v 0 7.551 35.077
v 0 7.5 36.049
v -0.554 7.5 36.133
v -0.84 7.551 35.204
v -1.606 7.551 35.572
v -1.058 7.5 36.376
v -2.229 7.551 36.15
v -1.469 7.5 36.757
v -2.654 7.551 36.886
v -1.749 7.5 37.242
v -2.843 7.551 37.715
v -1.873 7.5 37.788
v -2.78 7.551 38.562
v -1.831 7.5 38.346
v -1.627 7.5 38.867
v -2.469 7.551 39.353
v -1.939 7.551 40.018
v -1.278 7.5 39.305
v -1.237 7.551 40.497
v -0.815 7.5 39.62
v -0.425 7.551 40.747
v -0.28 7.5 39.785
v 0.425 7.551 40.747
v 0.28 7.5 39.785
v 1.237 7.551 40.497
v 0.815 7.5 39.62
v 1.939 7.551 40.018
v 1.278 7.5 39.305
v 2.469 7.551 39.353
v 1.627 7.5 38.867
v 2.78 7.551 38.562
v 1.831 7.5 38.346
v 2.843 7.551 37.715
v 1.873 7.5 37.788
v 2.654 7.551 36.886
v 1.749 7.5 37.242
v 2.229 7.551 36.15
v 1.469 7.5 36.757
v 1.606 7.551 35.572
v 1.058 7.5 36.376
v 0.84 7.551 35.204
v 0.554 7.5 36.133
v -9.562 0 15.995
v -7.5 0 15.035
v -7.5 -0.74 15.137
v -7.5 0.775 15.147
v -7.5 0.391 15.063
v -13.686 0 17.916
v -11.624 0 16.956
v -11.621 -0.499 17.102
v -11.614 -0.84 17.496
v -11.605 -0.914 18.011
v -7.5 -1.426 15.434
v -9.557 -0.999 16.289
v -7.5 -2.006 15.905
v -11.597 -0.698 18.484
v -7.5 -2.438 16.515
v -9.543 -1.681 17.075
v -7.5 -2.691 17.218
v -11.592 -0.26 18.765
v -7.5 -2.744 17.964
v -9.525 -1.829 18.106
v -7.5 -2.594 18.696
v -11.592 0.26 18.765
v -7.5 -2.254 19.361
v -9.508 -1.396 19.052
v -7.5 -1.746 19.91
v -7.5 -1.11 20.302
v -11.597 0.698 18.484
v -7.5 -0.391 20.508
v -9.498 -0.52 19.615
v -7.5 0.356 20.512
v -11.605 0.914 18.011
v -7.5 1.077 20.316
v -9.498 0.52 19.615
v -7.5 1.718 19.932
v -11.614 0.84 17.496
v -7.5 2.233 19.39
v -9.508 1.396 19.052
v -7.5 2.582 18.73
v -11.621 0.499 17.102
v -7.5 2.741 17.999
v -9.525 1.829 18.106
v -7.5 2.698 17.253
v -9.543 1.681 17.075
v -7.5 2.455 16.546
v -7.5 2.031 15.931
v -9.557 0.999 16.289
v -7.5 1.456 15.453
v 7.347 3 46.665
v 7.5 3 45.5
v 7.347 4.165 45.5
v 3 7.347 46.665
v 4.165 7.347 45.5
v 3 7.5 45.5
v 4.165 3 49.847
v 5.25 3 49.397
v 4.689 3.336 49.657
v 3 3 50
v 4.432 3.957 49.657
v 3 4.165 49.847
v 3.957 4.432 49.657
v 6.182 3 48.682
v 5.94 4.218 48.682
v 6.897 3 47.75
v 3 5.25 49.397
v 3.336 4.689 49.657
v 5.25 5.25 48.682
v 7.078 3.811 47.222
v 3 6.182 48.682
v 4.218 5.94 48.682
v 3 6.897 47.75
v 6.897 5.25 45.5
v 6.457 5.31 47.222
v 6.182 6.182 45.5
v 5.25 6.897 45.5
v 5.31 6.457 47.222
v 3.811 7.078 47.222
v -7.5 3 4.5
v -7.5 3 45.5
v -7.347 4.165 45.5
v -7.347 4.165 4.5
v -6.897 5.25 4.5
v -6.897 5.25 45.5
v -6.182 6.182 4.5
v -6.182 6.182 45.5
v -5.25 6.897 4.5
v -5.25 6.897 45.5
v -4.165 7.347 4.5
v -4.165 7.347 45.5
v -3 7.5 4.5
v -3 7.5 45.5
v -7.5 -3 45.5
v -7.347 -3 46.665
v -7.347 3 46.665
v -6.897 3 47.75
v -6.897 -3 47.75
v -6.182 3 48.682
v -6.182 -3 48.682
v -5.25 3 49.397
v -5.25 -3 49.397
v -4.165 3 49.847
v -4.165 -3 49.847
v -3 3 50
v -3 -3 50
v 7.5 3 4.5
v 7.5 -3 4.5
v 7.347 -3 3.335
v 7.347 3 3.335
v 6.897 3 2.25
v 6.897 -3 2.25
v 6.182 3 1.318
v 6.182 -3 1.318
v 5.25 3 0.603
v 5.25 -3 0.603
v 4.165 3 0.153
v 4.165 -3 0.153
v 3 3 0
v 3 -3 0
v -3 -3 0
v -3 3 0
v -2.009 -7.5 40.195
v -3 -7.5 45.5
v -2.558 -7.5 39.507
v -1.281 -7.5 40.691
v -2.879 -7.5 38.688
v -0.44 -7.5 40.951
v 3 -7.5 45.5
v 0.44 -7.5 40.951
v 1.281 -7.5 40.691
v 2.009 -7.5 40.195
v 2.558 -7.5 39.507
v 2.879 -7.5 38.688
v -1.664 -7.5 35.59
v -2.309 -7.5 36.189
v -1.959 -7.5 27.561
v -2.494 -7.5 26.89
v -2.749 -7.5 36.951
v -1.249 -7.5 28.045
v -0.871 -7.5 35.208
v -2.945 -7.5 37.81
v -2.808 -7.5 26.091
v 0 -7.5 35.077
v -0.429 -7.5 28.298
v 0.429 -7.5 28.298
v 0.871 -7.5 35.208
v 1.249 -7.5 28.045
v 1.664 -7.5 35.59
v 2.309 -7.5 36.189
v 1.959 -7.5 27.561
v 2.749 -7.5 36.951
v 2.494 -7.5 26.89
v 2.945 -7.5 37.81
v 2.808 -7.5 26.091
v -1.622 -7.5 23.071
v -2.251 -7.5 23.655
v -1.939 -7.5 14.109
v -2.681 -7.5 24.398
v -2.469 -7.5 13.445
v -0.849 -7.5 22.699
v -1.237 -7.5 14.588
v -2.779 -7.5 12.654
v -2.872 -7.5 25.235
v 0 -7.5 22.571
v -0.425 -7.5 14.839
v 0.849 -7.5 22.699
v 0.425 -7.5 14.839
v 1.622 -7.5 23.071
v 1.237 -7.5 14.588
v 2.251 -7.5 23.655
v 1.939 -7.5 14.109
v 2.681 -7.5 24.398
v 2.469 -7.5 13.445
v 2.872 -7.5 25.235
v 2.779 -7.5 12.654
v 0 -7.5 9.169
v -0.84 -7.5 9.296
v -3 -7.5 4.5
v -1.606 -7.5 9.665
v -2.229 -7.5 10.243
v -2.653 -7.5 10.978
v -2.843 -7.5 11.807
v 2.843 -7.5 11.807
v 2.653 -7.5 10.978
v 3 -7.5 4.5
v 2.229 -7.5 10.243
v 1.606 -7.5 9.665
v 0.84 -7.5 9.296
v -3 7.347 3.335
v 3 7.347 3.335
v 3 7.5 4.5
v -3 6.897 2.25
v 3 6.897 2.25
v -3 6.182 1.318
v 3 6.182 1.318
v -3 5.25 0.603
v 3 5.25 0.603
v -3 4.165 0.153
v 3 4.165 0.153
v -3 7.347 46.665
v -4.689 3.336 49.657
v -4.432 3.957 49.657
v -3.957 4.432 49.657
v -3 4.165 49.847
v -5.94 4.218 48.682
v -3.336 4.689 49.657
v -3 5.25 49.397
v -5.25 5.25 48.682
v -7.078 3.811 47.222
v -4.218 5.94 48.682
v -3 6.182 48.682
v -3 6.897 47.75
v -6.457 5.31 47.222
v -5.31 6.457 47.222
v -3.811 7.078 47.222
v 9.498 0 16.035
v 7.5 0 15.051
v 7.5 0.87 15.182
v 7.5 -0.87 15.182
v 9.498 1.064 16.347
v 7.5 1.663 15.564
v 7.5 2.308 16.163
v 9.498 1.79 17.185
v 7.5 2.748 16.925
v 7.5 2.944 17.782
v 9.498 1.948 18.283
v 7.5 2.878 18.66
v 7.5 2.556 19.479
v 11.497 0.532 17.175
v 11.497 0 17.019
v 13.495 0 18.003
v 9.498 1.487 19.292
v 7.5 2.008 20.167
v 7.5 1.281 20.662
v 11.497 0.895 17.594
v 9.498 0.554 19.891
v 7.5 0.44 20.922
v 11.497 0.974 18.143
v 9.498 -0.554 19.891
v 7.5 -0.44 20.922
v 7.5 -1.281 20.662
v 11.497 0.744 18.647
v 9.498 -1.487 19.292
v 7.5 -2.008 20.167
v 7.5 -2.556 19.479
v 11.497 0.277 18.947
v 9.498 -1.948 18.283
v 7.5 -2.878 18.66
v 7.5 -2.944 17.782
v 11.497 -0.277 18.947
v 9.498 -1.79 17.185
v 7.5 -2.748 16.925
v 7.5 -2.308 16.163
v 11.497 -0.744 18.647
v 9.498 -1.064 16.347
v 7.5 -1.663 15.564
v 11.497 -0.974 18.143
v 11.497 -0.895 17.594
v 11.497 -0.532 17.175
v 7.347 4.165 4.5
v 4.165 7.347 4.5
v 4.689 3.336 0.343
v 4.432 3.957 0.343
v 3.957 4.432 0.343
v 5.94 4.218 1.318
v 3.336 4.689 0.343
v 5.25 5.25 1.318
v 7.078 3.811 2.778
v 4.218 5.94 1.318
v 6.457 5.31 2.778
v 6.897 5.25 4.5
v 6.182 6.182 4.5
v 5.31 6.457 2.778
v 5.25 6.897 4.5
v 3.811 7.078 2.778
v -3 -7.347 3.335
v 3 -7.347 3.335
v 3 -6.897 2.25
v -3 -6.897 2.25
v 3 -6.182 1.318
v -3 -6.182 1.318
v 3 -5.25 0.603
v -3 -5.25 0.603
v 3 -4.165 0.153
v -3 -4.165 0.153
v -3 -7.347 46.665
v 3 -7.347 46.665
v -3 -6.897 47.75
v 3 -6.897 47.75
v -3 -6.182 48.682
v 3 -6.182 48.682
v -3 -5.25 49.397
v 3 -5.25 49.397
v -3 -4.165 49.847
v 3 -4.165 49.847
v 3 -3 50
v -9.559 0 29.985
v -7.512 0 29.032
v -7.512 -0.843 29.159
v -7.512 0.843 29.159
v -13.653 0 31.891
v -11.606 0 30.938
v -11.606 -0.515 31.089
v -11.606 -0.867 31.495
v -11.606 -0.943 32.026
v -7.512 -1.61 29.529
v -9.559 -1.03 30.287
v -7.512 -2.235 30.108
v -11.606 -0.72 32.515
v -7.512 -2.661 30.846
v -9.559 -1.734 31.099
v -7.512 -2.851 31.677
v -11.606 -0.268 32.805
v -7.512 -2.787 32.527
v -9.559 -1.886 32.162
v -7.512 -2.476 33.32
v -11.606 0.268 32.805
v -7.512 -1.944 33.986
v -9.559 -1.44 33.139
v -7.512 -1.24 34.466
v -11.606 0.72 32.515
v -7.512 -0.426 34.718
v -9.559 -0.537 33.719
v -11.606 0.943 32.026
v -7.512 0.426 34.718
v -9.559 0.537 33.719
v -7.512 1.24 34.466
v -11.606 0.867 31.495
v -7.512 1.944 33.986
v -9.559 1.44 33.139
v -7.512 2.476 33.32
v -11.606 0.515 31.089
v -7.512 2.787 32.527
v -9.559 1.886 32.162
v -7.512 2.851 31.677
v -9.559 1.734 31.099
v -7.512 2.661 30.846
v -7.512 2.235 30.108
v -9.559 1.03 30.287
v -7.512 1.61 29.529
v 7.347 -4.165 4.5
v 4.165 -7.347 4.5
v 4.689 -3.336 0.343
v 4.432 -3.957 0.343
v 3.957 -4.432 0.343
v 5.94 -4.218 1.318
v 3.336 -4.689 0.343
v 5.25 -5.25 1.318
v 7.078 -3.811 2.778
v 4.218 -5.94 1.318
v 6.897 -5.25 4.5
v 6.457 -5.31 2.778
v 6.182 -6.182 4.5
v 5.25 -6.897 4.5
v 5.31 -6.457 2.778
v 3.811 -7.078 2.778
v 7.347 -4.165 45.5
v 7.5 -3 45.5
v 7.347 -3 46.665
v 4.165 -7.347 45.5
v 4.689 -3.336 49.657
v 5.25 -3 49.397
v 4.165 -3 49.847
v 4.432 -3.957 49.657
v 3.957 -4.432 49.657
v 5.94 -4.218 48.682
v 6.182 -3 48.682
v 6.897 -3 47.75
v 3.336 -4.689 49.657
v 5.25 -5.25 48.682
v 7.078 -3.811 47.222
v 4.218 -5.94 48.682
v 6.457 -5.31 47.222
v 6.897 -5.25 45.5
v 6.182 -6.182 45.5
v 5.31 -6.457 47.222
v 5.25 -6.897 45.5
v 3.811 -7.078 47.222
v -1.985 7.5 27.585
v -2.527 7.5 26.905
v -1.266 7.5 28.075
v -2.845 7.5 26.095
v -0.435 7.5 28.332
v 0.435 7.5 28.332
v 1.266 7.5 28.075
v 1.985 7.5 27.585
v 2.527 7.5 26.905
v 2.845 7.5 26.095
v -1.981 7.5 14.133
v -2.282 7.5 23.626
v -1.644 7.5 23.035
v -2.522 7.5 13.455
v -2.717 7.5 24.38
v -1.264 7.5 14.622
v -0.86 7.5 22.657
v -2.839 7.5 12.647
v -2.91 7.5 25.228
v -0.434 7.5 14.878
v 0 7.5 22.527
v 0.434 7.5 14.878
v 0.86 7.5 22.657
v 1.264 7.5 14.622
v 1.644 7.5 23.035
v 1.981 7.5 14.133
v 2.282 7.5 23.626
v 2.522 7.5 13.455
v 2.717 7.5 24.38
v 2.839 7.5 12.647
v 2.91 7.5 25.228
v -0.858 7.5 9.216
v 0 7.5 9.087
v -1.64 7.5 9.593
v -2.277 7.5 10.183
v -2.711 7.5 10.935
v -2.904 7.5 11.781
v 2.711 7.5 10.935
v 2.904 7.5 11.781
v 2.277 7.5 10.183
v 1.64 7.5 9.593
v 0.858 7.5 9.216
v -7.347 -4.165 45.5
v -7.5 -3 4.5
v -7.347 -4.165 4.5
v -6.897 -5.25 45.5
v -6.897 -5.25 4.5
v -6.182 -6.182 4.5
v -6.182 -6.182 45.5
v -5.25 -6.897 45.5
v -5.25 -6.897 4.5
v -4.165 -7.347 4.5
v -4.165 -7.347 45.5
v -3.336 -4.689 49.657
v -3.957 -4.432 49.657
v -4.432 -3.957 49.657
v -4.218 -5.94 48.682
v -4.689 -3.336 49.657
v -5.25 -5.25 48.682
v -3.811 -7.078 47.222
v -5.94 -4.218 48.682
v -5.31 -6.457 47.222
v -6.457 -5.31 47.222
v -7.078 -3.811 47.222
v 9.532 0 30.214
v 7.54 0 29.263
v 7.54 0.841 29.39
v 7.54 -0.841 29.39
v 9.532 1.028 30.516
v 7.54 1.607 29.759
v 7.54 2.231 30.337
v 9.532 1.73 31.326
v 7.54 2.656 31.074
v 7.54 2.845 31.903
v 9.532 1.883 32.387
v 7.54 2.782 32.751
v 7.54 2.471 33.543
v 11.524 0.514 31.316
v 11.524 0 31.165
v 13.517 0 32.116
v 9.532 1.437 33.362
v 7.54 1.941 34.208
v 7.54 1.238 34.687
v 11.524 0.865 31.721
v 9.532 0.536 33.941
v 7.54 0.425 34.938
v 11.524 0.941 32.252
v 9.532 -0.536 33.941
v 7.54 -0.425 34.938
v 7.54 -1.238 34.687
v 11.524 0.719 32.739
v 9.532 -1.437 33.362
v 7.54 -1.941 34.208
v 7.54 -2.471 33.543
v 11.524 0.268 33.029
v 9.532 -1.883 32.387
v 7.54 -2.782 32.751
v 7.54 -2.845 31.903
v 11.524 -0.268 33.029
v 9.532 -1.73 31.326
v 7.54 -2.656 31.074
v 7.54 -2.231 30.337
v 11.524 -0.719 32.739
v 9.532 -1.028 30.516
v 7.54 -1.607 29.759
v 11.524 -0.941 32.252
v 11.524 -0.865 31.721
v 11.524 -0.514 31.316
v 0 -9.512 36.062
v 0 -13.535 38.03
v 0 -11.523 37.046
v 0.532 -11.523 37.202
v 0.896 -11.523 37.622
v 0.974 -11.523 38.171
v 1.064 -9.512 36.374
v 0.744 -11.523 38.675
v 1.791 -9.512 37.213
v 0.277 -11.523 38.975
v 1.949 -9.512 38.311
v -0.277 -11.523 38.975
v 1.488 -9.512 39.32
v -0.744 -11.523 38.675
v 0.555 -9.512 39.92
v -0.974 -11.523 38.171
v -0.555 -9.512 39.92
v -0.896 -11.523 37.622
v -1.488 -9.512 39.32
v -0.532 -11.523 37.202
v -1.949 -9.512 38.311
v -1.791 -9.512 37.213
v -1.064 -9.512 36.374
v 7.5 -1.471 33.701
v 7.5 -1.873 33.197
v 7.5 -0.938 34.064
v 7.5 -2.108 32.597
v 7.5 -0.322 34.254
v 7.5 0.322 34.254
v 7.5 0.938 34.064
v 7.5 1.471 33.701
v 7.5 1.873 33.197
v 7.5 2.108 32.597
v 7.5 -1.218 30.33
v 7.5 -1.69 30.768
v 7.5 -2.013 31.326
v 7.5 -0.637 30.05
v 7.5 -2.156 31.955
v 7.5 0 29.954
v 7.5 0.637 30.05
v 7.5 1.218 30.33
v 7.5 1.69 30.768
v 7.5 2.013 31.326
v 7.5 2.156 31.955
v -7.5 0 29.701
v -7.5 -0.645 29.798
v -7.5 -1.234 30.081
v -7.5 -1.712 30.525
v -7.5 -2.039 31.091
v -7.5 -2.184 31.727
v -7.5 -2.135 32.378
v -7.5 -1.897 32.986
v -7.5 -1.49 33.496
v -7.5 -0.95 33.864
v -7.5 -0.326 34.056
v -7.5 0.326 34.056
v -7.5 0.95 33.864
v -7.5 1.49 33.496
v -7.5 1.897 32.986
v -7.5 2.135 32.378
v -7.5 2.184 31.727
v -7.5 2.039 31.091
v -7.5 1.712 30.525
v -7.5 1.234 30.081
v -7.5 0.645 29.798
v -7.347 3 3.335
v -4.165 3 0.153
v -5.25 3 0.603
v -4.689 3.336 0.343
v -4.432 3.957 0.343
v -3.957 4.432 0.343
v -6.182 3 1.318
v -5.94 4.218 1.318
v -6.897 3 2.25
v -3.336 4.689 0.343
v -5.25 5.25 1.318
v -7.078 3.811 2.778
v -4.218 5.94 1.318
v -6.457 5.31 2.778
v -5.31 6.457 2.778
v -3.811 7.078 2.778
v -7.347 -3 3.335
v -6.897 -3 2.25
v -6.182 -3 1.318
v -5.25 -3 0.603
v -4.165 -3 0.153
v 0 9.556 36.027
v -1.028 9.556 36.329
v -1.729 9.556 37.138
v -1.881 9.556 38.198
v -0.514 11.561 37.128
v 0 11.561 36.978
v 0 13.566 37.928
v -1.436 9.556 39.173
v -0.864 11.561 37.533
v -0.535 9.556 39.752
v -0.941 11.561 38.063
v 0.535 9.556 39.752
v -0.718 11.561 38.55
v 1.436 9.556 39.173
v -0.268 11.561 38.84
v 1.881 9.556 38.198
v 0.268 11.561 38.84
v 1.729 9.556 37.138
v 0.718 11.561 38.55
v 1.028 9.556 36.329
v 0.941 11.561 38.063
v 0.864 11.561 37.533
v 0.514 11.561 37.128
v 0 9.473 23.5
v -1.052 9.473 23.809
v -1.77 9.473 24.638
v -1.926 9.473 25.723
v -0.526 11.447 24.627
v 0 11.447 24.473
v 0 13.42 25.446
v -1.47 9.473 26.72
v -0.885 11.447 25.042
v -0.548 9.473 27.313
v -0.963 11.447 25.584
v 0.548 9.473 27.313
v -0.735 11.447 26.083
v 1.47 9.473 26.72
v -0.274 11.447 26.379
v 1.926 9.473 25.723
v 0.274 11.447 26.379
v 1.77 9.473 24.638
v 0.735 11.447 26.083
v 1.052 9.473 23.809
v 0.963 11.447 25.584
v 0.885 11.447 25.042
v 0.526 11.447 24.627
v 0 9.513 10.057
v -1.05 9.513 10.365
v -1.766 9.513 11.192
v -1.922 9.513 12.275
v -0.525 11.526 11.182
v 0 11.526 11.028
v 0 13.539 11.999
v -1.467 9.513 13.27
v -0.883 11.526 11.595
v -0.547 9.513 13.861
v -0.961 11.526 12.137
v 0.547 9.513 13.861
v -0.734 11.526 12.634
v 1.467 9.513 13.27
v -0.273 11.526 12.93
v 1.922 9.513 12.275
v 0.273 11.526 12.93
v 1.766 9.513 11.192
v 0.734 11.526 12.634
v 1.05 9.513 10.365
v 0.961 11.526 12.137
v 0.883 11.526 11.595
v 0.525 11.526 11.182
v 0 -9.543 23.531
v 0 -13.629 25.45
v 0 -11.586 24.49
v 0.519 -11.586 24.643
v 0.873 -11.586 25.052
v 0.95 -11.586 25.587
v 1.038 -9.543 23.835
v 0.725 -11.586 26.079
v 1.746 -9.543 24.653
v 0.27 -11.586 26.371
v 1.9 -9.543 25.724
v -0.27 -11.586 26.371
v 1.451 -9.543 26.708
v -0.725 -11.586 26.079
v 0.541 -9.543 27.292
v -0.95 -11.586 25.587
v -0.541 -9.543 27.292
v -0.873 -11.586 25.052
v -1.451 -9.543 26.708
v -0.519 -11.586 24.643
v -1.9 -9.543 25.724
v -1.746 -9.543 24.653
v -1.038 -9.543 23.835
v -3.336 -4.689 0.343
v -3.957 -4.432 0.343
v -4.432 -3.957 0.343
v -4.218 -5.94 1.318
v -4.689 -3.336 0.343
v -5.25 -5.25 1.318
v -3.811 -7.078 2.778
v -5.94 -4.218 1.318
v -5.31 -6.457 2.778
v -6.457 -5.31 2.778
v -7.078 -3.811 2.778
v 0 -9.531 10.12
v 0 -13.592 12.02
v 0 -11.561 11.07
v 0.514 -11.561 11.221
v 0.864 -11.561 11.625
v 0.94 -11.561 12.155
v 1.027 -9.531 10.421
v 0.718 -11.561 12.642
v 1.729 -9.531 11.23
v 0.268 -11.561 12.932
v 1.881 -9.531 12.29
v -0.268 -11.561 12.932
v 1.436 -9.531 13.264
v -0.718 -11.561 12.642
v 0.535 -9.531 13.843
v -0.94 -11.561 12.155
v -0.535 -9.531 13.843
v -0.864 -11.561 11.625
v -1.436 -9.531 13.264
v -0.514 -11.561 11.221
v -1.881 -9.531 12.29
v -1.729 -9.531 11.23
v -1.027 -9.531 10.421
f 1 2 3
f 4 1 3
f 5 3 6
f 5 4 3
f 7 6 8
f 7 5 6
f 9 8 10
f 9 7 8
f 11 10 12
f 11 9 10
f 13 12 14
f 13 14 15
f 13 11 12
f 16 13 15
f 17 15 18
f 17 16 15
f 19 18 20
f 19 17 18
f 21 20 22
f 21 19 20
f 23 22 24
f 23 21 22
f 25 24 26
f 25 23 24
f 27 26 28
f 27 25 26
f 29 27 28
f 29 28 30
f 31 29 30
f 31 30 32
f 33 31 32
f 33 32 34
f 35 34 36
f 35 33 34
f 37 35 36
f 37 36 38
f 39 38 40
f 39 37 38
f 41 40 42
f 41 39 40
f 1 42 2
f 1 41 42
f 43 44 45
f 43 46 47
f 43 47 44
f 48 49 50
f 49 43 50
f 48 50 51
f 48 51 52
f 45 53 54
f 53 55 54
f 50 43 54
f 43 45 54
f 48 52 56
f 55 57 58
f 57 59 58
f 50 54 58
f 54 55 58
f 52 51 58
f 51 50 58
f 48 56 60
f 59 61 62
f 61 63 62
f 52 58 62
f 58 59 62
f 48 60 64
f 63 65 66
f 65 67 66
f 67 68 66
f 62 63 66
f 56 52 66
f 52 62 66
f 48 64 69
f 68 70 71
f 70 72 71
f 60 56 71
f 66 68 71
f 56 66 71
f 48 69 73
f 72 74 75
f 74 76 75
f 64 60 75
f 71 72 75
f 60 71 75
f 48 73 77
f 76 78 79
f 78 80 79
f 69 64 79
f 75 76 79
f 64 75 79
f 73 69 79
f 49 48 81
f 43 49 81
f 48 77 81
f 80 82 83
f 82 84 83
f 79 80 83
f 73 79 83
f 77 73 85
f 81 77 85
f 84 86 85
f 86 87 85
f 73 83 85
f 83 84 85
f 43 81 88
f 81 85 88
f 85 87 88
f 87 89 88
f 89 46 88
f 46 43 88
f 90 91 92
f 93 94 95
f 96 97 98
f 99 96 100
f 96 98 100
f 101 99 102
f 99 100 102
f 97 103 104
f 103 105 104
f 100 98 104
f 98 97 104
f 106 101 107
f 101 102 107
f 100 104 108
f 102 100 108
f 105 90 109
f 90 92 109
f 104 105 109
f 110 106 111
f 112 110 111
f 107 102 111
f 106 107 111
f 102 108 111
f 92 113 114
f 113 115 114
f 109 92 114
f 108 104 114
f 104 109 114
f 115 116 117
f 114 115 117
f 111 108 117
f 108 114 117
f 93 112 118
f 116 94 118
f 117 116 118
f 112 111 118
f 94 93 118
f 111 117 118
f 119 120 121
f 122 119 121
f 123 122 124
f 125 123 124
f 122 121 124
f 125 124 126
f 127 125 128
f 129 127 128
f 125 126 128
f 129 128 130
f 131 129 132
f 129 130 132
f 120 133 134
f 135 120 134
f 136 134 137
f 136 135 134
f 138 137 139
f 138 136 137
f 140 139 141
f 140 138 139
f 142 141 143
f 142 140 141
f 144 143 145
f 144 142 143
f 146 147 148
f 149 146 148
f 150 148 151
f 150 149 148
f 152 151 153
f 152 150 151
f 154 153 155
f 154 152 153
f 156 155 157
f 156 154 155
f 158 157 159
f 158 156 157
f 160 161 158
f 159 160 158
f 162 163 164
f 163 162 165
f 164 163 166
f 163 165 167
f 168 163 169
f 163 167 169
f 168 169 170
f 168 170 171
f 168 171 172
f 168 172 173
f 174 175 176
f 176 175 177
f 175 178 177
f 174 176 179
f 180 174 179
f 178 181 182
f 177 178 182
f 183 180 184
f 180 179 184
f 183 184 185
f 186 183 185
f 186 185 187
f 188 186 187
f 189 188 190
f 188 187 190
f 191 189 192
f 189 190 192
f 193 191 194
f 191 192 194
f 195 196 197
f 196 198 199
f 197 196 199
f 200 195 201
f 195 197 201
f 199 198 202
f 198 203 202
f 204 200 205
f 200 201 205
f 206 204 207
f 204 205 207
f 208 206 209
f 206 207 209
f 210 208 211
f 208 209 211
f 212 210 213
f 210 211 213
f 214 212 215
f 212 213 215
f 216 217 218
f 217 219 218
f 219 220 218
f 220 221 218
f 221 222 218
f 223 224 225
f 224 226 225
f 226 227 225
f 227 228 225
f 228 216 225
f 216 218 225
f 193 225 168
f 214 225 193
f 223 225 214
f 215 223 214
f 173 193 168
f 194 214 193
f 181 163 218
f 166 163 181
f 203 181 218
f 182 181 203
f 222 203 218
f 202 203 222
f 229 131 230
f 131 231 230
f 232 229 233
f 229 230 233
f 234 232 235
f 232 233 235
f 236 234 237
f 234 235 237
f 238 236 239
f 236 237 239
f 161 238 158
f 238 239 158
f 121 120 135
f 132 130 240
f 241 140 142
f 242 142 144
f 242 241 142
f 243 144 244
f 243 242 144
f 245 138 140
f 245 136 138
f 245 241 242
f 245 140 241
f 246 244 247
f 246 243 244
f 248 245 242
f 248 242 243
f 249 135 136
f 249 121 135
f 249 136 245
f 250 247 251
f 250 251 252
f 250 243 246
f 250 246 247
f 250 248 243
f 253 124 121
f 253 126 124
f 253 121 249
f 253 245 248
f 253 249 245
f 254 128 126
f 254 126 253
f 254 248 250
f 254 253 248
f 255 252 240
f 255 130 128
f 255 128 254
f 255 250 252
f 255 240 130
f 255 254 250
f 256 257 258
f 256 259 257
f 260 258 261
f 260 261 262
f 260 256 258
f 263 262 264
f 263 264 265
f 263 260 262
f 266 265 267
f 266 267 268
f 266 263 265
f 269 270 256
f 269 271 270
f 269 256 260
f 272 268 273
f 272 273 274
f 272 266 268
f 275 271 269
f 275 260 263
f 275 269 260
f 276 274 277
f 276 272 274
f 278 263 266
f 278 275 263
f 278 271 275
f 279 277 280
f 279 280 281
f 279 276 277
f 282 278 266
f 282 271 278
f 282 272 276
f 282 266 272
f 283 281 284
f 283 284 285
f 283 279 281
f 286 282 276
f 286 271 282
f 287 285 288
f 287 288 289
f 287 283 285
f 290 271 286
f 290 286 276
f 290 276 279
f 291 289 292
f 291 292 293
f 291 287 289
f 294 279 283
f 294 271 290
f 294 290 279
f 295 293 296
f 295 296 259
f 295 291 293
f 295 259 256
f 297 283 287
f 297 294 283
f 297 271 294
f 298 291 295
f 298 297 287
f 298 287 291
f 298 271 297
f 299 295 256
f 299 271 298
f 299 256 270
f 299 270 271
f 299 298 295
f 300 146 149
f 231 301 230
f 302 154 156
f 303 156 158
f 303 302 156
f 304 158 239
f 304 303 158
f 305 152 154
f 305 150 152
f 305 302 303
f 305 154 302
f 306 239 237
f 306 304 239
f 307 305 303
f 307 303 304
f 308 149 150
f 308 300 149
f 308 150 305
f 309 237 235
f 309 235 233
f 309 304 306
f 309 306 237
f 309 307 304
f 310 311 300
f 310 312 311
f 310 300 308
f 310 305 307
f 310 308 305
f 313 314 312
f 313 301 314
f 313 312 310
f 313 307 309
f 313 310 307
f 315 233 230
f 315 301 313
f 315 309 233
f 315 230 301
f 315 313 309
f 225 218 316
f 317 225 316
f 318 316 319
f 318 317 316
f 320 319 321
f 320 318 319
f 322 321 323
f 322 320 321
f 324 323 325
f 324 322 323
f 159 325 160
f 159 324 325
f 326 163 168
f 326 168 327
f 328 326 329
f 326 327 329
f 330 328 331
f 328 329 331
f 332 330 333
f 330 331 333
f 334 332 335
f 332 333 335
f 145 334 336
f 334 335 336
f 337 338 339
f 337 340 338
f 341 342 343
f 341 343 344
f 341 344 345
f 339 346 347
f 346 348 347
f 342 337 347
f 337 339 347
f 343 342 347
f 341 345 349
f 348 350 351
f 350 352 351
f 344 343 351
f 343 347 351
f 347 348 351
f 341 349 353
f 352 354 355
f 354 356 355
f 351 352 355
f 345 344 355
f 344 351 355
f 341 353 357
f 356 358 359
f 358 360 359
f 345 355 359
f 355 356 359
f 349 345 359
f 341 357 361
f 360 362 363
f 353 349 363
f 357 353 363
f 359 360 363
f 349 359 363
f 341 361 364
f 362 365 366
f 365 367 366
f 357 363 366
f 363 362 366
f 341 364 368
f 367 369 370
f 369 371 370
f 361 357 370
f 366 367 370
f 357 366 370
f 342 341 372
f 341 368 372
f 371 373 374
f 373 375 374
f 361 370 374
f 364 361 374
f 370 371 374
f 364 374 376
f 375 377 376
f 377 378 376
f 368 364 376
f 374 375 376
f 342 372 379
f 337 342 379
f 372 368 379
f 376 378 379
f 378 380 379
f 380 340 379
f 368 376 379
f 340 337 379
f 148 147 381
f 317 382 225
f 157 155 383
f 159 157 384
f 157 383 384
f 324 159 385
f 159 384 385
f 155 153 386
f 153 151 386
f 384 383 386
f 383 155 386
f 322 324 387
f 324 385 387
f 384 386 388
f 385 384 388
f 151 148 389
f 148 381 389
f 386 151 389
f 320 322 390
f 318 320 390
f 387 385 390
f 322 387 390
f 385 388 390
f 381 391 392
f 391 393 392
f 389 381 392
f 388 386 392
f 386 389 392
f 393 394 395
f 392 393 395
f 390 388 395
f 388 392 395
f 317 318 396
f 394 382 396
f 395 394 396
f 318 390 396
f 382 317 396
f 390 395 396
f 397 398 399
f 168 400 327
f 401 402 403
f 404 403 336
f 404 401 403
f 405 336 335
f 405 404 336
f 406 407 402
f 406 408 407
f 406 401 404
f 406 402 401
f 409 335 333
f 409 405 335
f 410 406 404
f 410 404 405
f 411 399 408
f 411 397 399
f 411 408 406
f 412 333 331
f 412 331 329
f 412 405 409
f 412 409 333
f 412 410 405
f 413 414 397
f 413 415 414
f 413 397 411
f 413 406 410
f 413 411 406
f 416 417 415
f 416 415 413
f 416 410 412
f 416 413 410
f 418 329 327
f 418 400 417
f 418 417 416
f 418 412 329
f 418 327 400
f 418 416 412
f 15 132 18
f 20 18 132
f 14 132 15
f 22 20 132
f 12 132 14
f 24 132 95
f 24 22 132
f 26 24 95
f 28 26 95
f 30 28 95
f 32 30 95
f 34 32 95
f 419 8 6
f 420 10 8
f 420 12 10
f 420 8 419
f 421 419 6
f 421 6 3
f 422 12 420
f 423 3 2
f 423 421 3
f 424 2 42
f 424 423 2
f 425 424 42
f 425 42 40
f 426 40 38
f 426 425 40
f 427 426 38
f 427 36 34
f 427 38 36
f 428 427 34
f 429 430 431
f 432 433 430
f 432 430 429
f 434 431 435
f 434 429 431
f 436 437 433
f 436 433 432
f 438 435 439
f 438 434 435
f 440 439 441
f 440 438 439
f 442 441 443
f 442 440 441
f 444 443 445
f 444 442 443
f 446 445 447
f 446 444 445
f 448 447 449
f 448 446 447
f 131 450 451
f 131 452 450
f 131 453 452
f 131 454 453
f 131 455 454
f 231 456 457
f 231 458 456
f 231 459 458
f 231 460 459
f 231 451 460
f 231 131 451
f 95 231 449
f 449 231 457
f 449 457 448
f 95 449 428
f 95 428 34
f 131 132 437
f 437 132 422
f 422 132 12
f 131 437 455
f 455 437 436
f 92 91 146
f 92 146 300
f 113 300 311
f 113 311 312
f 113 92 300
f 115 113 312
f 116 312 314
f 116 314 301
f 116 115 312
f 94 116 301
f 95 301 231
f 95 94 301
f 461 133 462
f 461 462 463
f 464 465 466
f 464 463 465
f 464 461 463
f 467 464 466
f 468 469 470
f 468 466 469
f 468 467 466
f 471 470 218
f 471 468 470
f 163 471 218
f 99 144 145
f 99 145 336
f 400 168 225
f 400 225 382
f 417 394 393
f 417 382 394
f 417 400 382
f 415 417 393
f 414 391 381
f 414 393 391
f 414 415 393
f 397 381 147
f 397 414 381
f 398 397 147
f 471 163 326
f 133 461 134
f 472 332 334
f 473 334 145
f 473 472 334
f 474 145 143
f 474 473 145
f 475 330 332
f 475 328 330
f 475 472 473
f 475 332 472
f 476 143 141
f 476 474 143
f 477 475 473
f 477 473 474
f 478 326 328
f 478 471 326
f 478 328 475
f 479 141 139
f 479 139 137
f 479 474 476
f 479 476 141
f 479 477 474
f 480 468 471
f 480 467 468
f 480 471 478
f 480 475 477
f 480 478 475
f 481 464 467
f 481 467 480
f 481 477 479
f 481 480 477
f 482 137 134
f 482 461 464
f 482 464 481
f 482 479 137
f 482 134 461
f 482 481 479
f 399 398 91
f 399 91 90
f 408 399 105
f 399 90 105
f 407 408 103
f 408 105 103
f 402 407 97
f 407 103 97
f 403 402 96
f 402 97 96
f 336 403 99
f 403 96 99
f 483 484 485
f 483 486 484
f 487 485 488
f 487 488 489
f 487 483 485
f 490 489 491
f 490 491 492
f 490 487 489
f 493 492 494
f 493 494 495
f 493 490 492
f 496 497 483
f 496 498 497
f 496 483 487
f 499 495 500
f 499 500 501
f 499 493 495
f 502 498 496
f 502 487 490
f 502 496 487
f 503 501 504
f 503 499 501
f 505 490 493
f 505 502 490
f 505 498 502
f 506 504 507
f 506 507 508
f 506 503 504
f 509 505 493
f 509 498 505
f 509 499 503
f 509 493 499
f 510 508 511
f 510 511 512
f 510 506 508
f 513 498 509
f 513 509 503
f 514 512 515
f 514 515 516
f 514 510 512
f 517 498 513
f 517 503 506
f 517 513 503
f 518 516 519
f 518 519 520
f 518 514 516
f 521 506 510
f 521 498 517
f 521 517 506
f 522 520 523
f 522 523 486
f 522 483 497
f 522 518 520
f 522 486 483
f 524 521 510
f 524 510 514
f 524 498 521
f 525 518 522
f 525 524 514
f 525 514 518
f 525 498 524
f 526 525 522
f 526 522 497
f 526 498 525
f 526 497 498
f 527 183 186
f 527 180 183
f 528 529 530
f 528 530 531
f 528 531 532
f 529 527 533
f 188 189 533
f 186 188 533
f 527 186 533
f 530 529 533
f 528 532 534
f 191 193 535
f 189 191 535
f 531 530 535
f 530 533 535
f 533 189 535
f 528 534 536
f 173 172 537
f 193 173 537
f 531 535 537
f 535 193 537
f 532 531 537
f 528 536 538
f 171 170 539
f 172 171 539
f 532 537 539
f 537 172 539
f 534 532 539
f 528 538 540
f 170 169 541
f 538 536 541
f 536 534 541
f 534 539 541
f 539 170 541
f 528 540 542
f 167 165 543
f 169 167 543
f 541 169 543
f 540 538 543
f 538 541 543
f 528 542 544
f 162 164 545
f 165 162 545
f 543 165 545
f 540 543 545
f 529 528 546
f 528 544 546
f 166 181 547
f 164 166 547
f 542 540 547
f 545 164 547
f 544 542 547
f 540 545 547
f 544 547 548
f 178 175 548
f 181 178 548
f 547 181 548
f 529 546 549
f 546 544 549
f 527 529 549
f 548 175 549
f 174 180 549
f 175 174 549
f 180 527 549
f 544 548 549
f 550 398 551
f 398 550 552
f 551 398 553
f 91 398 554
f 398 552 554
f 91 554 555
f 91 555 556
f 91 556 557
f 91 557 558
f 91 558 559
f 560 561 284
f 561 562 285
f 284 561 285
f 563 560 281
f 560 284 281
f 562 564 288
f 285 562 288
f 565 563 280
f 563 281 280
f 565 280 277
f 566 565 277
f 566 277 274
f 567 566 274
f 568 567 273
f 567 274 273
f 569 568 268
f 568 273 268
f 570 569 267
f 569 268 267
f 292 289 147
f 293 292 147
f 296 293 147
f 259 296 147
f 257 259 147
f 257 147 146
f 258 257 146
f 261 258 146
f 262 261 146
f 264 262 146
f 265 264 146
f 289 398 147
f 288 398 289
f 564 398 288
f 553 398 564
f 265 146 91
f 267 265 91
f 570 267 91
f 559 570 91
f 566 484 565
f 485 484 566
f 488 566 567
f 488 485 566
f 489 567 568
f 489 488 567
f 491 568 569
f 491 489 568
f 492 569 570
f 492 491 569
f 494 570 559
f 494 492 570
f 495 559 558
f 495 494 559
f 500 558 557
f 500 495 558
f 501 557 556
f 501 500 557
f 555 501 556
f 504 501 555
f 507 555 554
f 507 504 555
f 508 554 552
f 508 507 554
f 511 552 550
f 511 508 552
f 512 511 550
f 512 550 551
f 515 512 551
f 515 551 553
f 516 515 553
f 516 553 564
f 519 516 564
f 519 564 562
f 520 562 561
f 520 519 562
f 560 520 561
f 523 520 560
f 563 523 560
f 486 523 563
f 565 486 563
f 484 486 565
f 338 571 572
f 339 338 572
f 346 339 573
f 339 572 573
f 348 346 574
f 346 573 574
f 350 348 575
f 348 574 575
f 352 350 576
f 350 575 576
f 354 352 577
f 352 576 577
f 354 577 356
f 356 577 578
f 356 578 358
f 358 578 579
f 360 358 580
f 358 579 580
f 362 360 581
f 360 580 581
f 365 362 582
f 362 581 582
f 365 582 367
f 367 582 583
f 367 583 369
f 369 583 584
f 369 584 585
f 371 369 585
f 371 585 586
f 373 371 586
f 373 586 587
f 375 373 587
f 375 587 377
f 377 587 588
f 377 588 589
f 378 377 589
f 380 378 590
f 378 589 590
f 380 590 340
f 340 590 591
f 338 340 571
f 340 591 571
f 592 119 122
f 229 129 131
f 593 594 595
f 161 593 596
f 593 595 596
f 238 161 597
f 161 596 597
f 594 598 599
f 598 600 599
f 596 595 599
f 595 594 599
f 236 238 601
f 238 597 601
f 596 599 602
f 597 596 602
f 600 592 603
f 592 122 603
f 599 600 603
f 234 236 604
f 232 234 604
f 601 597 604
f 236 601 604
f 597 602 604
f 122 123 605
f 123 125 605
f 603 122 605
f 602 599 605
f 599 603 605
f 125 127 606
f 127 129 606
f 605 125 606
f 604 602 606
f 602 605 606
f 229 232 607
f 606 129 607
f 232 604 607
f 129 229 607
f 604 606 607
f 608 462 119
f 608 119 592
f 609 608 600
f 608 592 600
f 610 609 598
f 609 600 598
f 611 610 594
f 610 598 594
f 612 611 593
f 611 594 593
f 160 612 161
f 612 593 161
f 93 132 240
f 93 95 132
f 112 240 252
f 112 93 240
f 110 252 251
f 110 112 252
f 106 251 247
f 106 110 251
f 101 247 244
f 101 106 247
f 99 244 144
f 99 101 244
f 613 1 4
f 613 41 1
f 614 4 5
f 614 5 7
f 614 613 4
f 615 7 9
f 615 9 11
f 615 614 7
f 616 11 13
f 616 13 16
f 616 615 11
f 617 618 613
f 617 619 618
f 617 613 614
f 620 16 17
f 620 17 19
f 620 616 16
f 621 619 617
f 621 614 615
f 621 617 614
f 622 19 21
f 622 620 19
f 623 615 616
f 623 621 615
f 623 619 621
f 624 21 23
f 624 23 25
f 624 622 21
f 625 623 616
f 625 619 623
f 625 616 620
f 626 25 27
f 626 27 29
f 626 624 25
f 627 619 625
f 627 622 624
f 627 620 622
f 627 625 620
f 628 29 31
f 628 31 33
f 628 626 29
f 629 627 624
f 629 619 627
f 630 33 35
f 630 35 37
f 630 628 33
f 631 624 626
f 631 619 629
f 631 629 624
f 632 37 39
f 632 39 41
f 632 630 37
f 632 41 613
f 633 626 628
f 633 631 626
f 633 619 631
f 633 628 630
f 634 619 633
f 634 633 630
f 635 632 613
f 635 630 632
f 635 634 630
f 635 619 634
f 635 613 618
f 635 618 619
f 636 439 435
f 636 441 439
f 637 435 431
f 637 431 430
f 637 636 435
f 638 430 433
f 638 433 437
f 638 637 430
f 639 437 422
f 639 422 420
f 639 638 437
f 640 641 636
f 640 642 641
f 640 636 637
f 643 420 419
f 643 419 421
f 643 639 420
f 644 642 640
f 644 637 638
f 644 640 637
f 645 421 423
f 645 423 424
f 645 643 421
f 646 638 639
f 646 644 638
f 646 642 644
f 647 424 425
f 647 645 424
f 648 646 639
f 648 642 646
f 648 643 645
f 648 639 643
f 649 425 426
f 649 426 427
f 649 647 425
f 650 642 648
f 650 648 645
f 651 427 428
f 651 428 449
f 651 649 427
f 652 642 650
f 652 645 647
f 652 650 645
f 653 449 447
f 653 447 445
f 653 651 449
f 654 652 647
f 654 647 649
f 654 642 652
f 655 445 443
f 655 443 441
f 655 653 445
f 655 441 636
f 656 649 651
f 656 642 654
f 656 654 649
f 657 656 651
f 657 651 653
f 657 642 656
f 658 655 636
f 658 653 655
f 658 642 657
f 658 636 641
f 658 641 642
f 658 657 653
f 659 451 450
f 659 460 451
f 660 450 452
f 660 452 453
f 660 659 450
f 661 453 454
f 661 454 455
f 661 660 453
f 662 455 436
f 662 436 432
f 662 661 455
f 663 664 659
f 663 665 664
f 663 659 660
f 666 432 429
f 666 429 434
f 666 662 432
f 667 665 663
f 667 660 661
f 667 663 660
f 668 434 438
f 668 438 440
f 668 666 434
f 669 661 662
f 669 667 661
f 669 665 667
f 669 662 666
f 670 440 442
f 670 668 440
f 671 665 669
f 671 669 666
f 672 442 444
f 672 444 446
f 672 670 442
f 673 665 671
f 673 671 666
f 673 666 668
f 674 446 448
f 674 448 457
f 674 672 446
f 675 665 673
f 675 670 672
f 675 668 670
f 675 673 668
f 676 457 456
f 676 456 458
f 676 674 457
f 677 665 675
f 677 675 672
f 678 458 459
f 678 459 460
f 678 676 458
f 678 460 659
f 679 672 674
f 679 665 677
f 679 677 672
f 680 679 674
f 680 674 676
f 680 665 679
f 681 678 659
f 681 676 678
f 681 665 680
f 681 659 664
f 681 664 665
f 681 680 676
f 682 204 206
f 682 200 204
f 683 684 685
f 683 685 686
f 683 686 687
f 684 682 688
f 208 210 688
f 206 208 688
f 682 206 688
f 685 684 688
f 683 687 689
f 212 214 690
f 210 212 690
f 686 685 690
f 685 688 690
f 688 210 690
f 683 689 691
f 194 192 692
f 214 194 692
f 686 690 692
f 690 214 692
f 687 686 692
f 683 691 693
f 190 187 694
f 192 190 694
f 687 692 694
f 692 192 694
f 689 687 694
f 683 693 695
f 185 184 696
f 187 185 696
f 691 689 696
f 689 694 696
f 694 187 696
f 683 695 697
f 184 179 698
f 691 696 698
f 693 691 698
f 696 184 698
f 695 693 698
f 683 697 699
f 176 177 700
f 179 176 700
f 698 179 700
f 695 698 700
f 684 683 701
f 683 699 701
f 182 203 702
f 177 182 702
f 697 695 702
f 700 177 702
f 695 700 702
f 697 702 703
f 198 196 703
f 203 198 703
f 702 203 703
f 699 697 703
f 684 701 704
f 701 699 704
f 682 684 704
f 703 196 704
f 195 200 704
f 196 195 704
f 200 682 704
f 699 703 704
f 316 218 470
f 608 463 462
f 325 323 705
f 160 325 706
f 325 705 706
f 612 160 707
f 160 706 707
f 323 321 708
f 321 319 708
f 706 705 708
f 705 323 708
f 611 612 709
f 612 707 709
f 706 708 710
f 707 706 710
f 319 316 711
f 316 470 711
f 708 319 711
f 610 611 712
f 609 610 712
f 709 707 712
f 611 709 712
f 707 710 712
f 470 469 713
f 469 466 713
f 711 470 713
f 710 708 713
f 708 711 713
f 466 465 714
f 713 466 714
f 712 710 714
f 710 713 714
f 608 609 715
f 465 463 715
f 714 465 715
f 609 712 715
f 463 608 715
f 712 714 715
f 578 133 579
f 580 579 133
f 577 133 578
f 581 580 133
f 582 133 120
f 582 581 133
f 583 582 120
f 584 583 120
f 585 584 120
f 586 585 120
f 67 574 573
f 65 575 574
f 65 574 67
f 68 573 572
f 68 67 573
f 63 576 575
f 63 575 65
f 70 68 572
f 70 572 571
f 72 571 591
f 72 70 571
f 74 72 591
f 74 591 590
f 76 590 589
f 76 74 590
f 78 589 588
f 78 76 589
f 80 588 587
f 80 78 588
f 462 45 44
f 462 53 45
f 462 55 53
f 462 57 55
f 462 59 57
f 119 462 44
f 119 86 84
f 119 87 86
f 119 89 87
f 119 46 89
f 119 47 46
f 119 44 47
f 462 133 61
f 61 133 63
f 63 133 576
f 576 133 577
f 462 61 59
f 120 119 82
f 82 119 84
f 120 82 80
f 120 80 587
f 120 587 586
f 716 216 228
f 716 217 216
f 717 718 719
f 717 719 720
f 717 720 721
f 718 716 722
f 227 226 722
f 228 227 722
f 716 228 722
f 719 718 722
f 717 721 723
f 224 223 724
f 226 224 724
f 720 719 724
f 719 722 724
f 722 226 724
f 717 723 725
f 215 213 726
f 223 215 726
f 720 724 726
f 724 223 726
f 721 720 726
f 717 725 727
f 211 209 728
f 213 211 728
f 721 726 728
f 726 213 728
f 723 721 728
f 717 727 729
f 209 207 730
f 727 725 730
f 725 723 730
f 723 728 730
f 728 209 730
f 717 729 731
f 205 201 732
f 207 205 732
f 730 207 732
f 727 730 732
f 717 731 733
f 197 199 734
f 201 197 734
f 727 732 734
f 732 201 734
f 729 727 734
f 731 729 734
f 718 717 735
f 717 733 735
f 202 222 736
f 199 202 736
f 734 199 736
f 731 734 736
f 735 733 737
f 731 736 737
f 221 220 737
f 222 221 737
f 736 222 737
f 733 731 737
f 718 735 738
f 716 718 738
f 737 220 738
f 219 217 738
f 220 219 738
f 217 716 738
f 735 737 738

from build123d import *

# Parameters (mm, degrees)
F0_W     = 15
F0_H     = 15
F1_DEPTH = 50
F2_R     = 4.5


with BuildPart() as f1:
    # F0 (on Top) → F1 (new body)
    with BuildSketch(Plane.XY):
        Rectangle(F0_W, F0_H)
    extrude(amount=F1_DEPTH)

    # F2
    f2_edges = [f1.edges().sort_by_distance(p)[0] for p in [
        (7.5, -7.5, 25),
        (7.5, 7.5, 25),
        (7.5, 0, 0),
        (7.5, 0, 50),
        (-7.5, -7.5, 25),
        (0, -7.5, 0),
        (0, -7.5, 50),
        (-7.5, 7.5, 25),
        (-7.5, 0, 0),
        (-7.5, 0, 50),
        (0, 7.5, 0),
        (0, 7.5, 50),
    ]]
    fillet(f2_edges, radius=F2_R)

    # F3 (on Right) → F4 (revolve)
    with BuildSketch(Plane.YZ):
        Polygon((-7.4830586091, 35.0687503815), (-7.4501908384, 38.030475378), (-13.5346129537, 38.030475378), align=None)
    revolve(axis=Axis((0, -10.492401896, 38.030475378), (0, -1, 0)))

    # F3 (on Right) → F5 (revolve)
    with BuildSketch(Plane.YZ):
        Polygon((-7.4501908384, 22.5472543389), (-7.4830586091, 25.4503991455), (-13.6288413778, 25.4503991455), align=None)
    revolve(axis=Axis((0, -10.5559499934, 25.4503991455), (0, -1, 0)))

    # F3 (on Right) → F6 (revolve)
    with BuildSketch(Plane.YZ):
        Polygon((-7.4501908384, 9.1460486874), (-7.4501908384, 12.0198670775), (-13.5919097811, 12.0198670775), align=None)
    revolve(axis=Axis((0, -10.5210503098, 12.0198670775), (0, -1, 0)))

    # F7 (on Right) → F8 (revolve)
    with BuildSketch(Plane.YZ):
        Polygon((13.5657116771, 37.9279106855), (7.4009066448, 37.9279106855), (7.551304996, 35.076867789), align=None)
    revolve(axis=Axis((0, 10.4833091609, 37.9279106855), (0, 1, 0)))

    # F7 (on Right) → F9 (revolve)
    with BuildSketch(Plane.YZ):
        Polygon((13.4201068431, 25.4457890987), (7.4009066448, 25.4457890987), (7.4009066448, 22.4785897881), align=None)
    revolve(axis=Axis((0, 10.4105067439, 25.4457890987), (0, 1, 0)))

    # F7 (on Right) → F10 (revolve)
    with BuildSketch(Plane.YZ):
        Polygon((13.5394018143, 11.9986543432), (7.4009066448, 11.9986543432), (7.4009066448, 9.0387882665), align=None)
    revolve(axis=Axis((0, 10.4701542296, 11.9986543432), (0, 1, 0)))

    # F11 (on Front) → F12 (revolve)
    with BuildSketch(Plane.XZ):
        Polygon((13.516782783, 32.1163497865), (7.3755676858, 32.1163497865), (7.5397575274, 29.2632691562), align=None)
    revolve(axis=Axis((10.4461752344, 0, 32.1163497865), (1, 0, 0)))

    # F11 (on Front) → F13 (revolve)
    with BuildSketch(Plane.XZ):
        Polygon((13.4953791276, 18.0029701442), (7.3755676858, 18.0029701442), (7.3755676858, 14.9898957461), align=None)
    revolve(axis=Axis((10.4354734067, 0, 18.0029701442), (1, 0, 0)))

    # F14 (on Front) → F15 (revolve)
    with BuildSketch(Plane.XZ):
        Polygon((-7.5117792003, 29.0318671614), (-7.4614328332, 31.8906642497), (-13.6526133865, 31.8906642497), align=None)
    revolve(axis=Axis((-10.5570231099, 0, 31.8906642497), (-1, 0, 0)))

    # F14 (on Front) → F16 (revolve)
    with BuildSketch(Plane.XZ):
        Polygon((-7.4614328332, 15.0173101574), (-7.4614328332, 17.806250602), (-13.6857841818, 17.9158678529), align=None)
    revolve(axis=Axis((-10.5736085075, 0, 17.8610592275), (-0.9998449618, 0, 0.0176083016)))


solid = f1.part
